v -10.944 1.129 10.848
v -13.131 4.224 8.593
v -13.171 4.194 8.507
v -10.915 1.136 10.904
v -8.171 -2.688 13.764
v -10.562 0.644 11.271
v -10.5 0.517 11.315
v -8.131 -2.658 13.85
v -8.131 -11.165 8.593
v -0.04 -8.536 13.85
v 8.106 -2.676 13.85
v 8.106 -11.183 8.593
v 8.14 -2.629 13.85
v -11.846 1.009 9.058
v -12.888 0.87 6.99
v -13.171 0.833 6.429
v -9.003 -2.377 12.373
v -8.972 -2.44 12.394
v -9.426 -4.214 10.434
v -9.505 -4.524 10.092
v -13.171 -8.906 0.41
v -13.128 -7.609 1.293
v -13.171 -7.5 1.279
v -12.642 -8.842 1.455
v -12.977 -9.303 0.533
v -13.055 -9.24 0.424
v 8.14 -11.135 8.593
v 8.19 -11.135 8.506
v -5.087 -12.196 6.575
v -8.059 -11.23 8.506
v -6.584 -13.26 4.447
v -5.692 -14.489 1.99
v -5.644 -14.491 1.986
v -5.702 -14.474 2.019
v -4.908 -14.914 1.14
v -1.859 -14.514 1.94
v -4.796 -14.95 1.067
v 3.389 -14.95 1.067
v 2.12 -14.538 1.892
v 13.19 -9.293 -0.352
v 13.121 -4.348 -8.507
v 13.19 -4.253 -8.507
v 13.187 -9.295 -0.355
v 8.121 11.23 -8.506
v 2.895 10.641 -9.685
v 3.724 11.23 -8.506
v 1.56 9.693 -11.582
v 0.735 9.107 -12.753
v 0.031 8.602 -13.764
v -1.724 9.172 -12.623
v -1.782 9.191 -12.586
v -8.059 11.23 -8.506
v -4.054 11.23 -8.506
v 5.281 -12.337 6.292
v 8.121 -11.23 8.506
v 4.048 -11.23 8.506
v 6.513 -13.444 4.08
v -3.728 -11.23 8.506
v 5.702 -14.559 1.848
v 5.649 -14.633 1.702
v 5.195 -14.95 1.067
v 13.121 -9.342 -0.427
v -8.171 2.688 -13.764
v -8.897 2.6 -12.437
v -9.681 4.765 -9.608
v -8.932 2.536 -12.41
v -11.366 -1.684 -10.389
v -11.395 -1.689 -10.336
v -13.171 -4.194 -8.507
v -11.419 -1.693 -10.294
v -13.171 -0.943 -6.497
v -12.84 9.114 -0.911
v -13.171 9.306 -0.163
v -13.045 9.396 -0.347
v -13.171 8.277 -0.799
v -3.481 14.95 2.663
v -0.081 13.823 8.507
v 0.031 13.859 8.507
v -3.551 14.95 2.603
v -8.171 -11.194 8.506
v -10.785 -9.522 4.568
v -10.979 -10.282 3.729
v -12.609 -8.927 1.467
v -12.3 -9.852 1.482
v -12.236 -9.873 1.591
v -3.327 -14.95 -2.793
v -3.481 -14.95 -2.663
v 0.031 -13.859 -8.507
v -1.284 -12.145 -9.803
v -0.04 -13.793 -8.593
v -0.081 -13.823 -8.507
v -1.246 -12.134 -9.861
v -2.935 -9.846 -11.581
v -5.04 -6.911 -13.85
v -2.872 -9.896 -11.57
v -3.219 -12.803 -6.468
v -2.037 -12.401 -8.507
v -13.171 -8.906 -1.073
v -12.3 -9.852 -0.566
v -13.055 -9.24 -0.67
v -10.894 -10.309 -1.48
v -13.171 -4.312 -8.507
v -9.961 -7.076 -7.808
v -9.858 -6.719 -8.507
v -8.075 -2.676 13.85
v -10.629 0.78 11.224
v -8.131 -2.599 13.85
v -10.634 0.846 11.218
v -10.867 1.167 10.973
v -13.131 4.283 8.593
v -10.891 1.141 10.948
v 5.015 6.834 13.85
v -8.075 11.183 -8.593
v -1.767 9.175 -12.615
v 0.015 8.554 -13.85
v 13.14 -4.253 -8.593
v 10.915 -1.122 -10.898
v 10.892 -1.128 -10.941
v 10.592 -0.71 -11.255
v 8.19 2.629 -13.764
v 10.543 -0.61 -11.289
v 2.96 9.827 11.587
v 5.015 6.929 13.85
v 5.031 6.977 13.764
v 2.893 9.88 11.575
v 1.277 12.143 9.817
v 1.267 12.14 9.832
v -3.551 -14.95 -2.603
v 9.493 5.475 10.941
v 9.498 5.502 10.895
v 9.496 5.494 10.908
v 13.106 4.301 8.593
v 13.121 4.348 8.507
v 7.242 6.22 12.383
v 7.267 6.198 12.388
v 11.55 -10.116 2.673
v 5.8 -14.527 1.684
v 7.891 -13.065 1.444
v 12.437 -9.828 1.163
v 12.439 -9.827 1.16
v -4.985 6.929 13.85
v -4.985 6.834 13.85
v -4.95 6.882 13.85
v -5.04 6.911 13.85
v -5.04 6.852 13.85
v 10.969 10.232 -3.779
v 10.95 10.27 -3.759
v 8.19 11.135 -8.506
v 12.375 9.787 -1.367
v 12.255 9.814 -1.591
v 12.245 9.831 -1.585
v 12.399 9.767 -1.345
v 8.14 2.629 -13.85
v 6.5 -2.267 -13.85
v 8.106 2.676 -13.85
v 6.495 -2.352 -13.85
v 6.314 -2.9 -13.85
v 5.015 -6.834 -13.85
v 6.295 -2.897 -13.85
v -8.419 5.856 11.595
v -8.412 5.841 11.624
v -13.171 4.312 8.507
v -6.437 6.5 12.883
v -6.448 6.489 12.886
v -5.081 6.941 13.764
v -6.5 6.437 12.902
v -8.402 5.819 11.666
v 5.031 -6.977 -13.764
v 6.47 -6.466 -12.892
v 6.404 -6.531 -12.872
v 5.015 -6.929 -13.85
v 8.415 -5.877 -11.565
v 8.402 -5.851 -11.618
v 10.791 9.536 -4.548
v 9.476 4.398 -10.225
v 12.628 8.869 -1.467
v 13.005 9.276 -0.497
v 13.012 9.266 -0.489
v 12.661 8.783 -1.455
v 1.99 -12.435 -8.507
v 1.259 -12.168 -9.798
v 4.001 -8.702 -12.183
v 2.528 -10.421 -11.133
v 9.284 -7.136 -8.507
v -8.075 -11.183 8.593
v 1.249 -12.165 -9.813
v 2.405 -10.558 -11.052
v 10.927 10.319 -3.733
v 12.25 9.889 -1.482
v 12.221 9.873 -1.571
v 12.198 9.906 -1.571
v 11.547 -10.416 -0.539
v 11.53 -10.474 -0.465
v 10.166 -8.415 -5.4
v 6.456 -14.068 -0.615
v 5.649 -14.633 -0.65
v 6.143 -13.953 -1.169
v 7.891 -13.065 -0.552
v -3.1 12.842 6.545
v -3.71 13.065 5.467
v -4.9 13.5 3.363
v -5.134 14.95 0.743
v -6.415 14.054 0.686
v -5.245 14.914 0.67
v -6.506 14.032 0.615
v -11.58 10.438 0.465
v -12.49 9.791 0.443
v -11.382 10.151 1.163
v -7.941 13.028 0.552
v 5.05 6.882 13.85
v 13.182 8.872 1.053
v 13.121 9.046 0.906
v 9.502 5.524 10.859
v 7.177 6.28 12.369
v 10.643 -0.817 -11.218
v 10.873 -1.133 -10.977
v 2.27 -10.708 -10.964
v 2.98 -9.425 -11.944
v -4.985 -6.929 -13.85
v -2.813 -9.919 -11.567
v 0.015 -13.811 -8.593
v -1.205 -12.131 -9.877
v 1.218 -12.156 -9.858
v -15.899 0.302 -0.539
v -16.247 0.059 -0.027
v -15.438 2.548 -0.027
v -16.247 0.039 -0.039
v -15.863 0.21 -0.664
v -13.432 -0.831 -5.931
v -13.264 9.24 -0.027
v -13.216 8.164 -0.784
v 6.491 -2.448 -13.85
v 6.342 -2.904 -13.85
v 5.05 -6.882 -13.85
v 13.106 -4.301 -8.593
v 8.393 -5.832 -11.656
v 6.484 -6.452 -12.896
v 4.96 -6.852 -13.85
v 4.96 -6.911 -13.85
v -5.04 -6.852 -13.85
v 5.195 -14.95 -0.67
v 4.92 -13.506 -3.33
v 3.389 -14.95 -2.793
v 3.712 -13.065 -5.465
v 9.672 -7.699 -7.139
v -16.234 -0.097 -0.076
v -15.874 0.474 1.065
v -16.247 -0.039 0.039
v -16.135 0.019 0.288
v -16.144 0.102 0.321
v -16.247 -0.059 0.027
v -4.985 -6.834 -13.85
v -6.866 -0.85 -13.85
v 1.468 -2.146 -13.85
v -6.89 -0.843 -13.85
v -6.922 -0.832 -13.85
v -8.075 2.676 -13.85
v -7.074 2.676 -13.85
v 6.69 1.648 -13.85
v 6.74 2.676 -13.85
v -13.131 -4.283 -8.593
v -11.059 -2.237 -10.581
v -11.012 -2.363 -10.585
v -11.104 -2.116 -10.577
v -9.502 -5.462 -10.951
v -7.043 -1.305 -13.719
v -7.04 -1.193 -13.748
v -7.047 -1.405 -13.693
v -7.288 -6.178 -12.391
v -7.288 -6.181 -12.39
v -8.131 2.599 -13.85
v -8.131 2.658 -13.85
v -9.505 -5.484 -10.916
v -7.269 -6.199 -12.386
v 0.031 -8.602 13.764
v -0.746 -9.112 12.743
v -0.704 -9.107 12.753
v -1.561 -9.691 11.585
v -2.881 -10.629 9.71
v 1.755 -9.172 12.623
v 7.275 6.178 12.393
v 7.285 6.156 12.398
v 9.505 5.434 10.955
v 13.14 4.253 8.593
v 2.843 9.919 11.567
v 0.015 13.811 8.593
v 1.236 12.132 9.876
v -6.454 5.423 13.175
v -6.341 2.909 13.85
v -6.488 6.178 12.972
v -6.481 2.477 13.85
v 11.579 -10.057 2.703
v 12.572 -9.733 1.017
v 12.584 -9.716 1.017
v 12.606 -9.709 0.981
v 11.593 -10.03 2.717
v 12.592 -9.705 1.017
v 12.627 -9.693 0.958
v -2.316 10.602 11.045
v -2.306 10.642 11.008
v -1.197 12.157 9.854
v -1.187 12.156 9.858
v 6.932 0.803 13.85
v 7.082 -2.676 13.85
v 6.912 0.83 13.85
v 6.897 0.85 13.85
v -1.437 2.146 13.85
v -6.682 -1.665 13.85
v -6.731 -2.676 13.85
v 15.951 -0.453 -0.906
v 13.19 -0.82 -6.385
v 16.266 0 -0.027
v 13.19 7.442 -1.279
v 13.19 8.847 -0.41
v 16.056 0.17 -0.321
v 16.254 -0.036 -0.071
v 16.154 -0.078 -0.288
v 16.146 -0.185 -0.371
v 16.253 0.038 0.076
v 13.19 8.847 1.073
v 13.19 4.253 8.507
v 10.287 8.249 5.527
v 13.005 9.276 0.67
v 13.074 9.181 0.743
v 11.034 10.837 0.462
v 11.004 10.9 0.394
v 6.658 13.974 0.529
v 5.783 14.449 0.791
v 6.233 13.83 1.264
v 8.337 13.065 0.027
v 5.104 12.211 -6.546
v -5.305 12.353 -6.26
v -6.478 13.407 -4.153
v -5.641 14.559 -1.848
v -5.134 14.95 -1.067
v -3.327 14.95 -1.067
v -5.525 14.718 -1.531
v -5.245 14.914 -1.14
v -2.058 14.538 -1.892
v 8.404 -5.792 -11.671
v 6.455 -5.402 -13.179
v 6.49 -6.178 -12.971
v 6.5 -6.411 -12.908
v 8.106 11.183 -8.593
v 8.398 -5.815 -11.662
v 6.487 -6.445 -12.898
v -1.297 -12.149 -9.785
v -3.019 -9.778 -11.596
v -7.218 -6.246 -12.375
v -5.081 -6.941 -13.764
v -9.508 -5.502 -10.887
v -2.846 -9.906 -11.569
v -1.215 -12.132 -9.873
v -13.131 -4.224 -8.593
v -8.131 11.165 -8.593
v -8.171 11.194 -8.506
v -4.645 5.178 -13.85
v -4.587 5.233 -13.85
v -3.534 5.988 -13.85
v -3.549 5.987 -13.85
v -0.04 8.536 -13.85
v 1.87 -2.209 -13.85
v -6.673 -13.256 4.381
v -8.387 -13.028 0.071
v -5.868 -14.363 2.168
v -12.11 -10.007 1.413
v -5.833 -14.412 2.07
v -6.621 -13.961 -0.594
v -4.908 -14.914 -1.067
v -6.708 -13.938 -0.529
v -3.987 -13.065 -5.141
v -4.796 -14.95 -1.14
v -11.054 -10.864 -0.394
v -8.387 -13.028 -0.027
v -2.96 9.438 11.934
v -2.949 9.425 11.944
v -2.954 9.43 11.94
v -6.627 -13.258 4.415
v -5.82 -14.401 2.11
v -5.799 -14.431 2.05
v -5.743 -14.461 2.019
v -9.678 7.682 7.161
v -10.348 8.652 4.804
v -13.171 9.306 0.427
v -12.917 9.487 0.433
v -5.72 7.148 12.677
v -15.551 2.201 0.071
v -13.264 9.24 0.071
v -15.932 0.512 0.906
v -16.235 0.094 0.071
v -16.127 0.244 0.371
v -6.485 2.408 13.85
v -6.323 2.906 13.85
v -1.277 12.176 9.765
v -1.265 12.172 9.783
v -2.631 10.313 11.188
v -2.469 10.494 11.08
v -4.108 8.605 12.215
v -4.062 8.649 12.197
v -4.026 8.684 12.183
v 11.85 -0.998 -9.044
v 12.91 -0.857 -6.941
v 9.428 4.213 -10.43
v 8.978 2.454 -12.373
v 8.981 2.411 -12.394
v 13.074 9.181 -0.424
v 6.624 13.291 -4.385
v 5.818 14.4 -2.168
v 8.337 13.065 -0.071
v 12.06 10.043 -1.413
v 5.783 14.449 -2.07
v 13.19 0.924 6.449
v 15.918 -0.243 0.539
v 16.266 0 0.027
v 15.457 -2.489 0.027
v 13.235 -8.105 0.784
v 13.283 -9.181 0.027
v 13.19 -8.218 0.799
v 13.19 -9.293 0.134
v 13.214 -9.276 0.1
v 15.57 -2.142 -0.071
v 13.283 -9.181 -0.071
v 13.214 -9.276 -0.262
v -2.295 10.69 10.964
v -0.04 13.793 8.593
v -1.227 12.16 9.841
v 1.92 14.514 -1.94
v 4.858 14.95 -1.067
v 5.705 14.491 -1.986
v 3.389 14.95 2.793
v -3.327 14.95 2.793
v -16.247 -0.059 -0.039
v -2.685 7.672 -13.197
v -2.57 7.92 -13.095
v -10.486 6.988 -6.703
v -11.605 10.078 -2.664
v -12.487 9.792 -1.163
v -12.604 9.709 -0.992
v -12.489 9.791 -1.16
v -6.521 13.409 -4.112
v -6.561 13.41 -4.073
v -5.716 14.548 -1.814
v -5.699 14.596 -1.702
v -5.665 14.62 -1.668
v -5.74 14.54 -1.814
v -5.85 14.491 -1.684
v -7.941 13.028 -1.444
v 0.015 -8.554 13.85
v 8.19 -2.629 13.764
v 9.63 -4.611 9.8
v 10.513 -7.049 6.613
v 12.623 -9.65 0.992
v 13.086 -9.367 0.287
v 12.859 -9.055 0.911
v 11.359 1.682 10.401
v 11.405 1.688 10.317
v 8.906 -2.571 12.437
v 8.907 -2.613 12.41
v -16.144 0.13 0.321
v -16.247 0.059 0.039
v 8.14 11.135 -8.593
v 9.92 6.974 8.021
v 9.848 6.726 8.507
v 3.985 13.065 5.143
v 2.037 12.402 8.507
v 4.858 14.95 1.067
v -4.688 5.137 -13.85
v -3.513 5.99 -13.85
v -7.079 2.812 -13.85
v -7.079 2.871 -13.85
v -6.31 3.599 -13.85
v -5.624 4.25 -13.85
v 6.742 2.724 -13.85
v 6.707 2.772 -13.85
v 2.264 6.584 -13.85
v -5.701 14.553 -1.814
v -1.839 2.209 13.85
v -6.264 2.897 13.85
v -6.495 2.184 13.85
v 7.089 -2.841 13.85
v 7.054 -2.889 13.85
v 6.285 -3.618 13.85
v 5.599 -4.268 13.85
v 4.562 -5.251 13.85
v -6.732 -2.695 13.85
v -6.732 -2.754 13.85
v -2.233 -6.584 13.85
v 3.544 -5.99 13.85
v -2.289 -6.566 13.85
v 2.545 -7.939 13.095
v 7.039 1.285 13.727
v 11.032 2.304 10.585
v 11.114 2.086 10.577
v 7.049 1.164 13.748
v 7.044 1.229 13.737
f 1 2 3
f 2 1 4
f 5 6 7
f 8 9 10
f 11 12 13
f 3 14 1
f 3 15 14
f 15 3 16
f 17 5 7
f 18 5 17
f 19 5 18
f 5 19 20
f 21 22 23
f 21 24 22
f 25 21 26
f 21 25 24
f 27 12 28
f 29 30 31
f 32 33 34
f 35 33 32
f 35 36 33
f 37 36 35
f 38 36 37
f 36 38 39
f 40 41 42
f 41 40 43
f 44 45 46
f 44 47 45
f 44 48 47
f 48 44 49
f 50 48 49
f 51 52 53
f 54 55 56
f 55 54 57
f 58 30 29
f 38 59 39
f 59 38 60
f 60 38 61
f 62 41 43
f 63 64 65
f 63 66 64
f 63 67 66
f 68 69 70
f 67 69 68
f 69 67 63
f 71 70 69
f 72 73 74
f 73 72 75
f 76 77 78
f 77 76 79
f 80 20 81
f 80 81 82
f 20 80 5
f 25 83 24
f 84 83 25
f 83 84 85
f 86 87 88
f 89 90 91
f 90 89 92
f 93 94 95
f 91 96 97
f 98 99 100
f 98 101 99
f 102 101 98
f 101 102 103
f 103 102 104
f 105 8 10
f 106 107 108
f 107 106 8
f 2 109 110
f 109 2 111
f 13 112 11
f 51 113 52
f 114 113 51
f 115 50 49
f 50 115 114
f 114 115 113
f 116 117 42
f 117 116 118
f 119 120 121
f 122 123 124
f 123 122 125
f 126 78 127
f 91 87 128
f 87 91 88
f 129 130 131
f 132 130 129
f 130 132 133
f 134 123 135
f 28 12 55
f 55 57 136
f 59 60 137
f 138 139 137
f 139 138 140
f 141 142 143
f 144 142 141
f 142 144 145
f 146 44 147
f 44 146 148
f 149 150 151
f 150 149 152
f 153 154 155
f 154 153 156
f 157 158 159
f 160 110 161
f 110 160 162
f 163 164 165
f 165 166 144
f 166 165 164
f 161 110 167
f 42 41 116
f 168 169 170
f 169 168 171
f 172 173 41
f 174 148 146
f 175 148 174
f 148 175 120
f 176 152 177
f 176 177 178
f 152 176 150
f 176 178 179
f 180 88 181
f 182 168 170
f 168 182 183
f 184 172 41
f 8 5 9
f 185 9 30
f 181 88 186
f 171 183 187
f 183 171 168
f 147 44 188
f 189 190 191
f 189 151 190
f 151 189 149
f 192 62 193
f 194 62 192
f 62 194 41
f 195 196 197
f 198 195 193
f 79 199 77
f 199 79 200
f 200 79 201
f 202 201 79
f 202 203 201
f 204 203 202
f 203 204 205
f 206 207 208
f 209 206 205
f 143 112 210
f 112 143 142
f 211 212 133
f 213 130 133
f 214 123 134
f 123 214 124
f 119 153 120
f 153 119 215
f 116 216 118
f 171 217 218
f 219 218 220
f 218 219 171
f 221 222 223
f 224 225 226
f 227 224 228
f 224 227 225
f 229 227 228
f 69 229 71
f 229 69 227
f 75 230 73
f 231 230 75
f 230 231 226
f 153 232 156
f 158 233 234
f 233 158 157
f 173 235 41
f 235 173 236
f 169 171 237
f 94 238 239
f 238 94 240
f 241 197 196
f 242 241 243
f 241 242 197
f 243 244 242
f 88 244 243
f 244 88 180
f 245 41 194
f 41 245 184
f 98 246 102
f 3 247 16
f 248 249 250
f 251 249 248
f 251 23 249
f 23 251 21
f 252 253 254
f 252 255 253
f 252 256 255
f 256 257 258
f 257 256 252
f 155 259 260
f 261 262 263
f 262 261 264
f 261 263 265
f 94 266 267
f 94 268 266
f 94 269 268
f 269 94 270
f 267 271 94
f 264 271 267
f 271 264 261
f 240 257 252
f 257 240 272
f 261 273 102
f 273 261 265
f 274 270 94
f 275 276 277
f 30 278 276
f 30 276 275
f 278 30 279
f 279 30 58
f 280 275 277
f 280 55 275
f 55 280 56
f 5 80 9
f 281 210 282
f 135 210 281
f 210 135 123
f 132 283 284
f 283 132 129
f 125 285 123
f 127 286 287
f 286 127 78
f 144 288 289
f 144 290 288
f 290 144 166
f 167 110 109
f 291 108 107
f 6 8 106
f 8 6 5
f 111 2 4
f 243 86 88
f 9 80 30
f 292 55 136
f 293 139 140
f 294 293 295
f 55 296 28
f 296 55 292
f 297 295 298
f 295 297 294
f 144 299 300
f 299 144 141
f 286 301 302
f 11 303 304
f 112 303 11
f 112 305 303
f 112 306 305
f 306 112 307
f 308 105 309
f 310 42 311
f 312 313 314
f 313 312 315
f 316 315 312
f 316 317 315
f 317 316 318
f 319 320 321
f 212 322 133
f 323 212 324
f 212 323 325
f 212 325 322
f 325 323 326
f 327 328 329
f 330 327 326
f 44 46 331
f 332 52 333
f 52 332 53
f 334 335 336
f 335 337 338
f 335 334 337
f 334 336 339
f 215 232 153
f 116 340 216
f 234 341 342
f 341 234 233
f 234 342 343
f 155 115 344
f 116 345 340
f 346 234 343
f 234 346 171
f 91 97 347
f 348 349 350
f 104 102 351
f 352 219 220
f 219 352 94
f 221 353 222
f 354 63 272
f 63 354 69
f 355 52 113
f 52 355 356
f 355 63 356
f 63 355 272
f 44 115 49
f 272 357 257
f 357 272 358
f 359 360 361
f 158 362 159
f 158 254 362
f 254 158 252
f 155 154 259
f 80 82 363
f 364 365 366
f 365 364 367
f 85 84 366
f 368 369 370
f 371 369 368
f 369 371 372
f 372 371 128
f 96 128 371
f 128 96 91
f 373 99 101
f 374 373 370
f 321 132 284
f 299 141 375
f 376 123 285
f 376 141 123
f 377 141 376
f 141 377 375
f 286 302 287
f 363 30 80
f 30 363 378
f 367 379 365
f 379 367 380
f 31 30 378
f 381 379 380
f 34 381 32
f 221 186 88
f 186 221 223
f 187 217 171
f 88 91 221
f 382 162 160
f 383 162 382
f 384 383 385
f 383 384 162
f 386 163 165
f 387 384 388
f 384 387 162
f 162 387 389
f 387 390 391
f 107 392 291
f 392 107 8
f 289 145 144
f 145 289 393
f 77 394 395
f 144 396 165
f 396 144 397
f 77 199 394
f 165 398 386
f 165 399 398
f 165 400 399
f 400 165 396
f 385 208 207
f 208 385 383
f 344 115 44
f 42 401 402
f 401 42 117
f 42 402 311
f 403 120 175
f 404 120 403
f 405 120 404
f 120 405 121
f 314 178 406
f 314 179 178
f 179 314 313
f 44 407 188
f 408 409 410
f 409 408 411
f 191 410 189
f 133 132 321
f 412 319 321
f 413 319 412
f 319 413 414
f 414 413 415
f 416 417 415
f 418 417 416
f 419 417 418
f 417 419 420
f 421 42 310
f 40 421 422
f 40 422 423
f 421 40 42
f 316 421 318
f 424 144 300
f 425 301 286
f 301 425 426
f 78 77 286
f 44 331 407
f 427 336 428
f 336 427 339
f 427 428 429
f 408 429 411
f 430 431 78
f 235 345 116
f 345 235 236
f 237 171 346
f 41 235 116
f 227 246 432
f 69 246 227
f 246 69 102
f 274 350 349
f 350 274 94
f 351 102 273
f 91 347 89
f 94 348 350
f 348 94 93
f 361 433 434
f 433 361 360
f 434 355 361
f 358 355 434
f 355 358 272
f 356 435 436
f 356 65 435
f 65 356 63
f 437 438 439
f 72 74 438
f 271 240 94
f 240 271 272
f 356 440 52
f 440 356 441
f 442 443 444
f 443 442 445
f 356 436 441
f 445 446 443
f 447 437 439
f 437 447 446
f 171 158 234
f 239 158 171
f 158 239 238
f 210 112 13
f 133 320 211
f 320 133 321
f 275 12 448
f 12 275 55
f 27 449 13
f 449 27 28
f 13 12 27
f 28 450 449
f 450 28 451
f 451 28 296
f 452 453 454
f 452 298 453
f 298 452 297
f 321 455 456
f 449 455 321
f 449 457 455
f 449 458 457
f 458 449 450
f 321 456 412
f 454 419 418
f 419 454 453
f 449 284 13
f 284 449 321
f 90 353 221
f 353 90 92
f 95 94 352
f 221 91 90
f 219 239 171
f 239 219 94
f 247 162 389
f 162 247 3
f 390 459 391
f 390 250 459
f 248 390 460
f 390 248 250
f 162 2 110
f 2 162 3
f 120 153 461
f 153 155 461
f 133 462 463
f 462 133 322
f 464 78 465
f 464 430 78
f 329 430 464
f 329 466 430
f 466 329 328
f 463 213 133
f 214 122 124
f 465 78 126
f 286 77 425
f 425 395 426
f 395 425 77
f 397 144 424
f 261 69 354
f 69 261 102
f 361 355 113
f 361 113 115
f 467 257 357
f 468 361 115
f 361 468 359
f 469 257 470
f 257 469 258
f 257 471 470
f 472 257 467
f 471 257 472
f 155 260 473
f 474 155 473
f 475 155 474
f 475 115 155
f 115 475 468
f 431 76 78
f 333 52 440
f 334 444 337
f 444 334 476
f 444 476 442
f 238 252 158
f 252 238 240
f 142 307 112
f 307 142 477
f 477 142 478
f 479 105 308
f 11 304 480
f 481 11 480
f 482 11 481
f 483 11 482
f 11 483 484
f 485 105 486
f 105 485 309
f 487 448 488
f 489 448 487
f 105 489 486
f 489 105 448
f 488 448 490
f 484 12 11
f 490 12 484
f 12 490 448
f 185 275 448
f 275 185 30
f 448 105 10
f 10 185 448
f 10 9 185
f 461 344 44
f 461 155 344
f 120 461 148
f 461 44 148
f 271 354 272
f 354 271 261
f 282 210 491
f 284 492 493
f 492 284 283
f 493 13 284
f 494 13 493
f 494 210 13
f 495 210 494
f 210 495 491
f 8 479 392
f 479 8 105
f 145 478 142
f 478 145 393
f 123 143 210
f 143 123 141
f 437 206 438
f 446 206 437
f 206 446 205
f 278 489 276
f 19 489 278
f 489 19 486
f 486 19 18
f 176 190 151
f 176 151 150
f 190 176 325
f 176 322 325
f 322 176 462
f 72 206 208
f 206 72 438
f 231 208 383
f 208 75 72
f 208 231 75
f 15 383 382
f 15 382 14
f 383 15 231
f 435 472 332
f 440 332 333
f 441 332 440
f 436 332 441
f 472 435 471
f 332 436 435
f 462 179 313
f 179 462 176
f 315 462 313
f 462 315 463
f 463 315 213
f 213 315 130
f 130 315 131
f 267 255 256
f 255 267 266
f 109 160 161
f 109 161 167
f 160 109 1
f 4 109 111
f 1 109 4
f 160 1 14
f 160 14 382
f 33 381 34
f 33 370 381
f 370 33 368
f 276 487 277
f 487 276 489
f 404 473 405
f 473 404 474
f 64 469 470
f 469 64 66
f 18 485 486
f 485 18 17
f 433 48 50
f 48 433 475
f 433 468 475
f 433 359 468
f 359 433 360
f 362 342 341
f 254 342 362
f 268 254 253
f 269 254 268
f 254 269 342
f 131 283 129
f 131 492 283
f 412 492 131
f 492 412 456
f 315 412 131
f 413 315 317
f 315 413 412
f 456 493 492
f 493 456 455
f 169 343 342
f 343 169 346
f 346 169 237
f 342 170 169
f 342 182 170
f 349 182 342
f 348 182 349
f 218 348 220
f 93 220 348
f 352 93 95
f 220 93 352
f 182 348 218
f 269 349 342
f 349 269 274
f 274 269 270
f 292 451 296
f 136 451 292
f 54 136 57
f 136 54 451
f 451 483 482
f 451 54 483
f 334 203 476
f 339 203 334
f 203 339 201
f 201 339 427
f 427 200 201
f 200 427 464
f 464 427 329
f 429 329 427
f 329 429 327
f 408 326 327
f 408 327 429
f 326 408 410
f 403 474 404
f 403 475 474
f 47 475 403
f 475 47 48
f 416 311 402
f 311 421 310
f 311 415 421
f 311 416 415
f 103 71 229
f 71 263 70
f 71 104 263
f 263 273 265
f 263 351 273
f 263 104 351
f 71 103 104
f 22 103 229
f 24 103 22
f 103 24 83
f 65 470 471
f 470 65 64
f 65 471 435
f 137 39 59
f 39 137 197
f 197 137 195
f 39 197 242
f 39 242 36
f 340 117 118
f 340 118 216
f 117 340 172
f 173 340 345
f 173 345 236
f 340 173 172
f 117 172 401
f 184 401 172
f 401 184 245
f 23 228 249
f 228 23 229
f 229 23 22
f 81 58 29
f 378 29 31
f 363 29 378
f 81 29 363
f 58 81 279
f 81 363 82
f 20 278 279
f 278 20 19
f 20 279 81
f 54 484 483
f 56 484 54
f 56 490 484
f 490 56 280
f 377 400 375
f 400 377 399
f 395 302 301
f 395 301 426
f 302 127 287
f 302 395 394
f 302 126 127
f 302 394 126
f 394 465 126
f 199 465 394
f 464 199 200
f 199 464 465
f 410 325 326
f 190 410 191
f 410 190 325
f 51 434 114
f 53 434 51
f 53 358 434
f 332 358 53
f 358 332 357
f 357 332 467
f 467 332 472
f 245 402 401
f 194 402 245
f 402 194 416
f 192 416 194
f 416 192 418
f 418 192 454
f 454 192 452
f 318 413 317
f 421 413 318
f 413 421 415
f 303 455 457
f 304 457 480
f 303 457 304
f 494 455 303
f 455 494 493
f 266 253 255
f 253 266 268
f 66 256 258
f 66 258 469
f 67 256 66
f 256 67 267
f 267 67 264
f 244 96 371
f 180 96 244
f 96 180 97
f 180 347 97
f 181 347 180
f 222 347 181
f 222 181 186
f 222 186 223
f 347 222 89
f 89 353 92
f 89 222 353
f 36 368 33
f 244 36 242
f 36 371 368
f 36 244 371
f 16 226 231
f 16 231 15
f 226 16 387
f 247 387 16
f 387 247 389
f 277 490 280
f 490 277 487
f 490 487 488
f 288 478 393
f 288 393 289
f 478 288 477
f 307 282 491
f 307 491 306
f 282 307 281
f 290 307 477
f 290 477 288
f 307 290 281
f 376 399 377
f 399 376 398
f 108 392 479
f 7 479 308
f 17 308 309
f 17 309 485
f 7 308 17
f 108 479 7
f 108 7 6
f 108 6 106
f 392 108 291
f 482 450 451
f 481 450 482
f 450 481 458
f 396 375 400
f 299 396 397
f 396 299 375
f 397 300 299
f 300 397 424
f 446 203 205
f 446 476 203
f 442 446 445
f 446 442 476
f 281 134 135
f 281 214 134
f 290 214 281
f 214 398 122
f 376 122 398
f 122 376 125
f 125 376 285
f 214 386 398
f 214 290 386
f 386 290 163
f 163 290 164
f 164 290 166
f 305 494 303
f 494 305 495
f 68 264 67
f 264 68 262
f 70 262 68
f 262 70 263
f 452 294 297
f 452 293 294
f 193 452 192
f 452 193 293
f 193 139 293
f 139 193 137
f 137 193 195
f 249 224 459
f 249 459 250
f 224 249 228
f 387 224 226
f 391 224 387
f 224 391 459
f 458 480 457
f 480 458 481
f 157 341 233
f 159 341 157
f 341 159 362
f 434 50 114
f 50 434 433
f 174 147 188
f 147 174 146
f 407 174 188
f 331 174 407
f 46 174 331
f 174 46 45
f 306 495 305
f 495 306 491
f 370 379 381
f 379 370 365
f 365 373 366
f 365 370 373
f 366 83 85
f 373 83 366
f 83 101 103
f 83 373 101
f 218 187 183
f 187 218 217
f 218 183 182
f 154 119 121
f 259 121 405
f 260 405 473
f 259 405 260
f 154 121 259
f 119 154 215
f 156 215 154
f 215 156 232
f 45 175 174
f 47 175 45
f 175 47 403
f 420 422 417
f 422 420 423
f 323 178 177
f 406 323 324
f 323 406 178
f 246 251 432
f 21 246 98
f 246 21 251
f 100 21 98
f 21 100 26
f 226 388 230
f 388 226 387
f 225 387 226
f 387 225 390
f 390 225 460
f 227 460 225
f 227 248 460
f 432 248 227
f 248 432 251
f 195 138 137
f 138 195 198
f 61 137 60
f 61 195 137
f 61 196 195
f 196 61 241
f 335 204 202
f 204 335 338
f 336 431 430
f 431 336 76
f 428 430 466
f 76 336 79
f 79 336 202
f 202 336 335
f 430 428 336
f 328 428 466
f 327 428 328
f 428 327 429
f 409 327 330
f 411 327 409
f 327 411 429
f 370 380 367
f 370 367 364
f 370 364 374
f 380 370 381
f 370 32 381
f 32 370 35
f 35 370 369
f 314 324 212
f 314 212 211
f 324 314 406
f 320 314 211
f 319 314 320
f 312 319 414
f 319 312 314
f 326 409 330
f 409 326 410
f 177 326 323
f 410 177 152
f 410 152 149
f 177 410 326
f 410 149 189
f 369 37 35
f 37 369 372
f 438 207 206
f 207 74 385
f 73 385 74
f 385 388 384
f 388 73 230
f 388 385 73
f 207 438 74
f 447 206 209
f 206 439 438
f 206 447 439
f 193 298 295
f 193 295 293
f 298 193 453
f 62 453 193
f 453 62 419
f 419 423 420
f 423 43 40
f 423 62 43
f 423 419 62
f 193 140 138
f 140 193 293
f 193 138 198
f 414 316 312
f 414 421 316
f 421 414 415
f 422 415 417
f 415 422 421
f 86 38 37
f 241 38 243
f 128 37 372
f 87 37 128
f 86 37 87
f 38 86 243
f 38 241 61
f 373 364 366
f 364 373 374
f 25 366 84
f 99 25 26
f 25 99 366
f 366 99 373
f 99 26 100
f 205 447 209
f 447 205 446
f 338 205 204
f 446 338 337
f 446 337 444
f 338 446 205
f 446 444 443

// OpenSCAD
// Auto-generated OpenSCAD file

    shift = 0;

    inner_points = 10*[[-0.04653735601242833, -1.1804350968444532, -1.1056406492993445],
  [-1.6166026037261467, 6.465865108477383e-14, 0.06804417958749302],
  [0.049641563947034416, -1.1066196143606377, 1.1793908313155077],
  [0.04653735601243055, 1.1804350968444688, 1.1056406492993445],
  [1.616602603726149, -4.9166964514920346e-14, -0.06804417958749302],
  [-0.049641563947032195, 1.1066196143606533, -1.1793908313155077],
  [-0.8306107268634214, -1.2969563212498596, -0.4960081752746857],
  [-1.2974190314728422, -0.9180843128618442, 0.30308256300708786],
  [-0.4826654868478813, -1.4854916227486177, 0.42235370875540656],
  [-0.8612909006373893, -0.6130277869576795, -1.2249117950476633],
  [-1.2686573637106064, -0.18853530149869363, 0.9864060636175853],
  [0.5164498685564554, -1.485491622748653, 0.38030009303373413],
  [0.7859918768627263, -1.2969563212499164, -0.5640523548621788],
  [-1.3470605954198756, 0.18853530149880124, -0.8763082683084198],
  [-0.4361281308354518, -0.30505652590415705, 1.527994358054751],
  [-0.7553117030887562, 0.6130277869577517, 1.2929559746351562],
  [1.318298927657642, -0.9180843128619364, 0.19298476769792233],
  [-0.5629872245688826, 0.3050565259042077, -1.4859407423330786],
  [0.8612909006373916, 0.613027786957695, 1.2249117950476633],
  [1.2686573637106087, 0.18853530149870912, -0.9864060636175853],
  [-0.5164498685564531, 1.4854916227486685, -0.38030009303373413],
  [-0.7859918768627241, 1.296956321249932, 0.5640523548621788],
  [1.3470605954198778, -0.18853530149878575, 0.8763082683084198],
  [0.43612813083545404, 0.3050565259041726, -1.527994358054751],
  [0.7553117030887584, -0.6130277869577362, -1.2929559746351562],
  [-1.3182989276576398, 0.9180843128619519, -0.19298476769792233],
  [0.5629872245688848, -0.30505652590419213, 1.4859407423330786],
  [0.8306107268634236, 1.2969563212498751, 0.4960081752746857],
  [1.2974190314728444, 0.9180843128618598, -0.30308256300708786],
  [0.4826654868478835, 1.4854916227486332, -0.42235370875540656]];

    outer_points_unshifted = 10*[[6.50114665913391e-07, 1.3763745554391253, 0.8506627251086194],
  [-1.051887261389621e-06, 0.8506627251088678, -1.3763745554387234],
  [1.6180339887494224, 0.0, -1.2365742555582488e-06],
  [-6.50114665913391e-07, -1.3763745554391253, -0.8506627251086194],
  [1.051887261389621e-06, -0.8506627251088678, 1.3763745554387234],
  [-1.6180339887494224, 0.0, 1.2365742555582488e-06],
  [0.5000000000100363, 1.5388417685299496, 1.2941252355854567e-05],
  [0.8090163442765206, 1.1135237293503313, -0.8506417857224506],
  [1.3090169943808583, 0.951056516259507, 7.233888893346937e-06],
  [-0.4999999999896717, 1.5388417685299496, 1.3705497275402664e-05],
  [0.8090159424835605, 0.26287747283842533, -1.376380262802186],
  [1.3090176444829382, 0.42531803917961825, 0.8506534904005509],
  [0.5000010518972977, 0.6881790434210817, 1.3763874966910794],
  [-0.8090176444729018, 1.1135237293503313, -0.850640549148195],
  [1.3090163442661924, -0.42531803917961825, -0.850655491219726],
  [0.4999989481024103, -0.6881790434210817, -1.3763882609359988],
  [0.8090180462658619, -0.26287747283842533, 1.3763790262279305],
  [-1.3090169943682723, 0.951056516259507, 9.234708068453283e-06],
  [0.4999999999896717, -1.5388417685299496, -1.3705497275402664e-05],
  [-0.8090159424835605, -0.26287747283842533, 1.376380262802186],
  [-1.3090176444829382, -0.42531803917961825, -0.8506534904005509],
  [-0.5000010518972977, -0.6881790434210817, -1.3763874966910794],
  [0.8090176444729018, -1.1135237293503313, 0.850640549148195],
  [-1.3090163442661924, 0.42531803917961825, 0.850655491219726],
  [-0.4999989481024103, 0.6881790434210817, 1.3763882609359988],
  [-0.8090180462658619, 0.26287747283842533, -1.3763790262279305],
  [1.3090169943682723, -0.951056516259507, -9.234708068453283e-06],
  [-0.5000000000100363, -1.5388417685299496, -1.2941252355854567e-05],
  [-0.8090163442765206, -1.1135237293503313, 0.8506417857224506],
  [-1.3090169943808583, -0.951056516259507, -7.233888893346937e-06]];
    
    outer_points = [for (p = outer_points_unshifted) [p[0], p[1], p[2] + shift]];

    // Convex hull for inner set (I)
    module inner_hull() {
        hull() {
            for (p = inner_points) {
                translate(p) sphere(r=0.1);
            }
        }
    }

    // Convex hull for outer set (O) minus inner hull (O \ I)
    module outer_minus_inner() {
        difference() {
            hull() {
                for (p = outer_points) {
                    translate(p) sphere(r=0.1);
                }
            }
            inner_hull(); // Subtract inner hull
        }
    }

    // Convex hull for outer set (O) minus all translated inner hulls
    module outer_minus_AllTranslationInner() {
        difference() {
            hull() {
                for (p = outer_points) {
                    translate(p) sphere(r=0.1);
                }
            }
            hull() {
                translate([0,0,50]) inner_hull();
                translate([0,0,-50]) inner_hull();
            }; // Subtract translated inner hulls
        }
    }

    // Difference between outer_minus_inner and outer_minus_AllTranslationInner
    module outer_minus_inner_diff() {
        difference() {
            // Outer minus inner
            difference() {
                hull() {
                    for (p = outer_points) {
                        translate(p) sphere(r=0.1);
                    }
                }
                inner_hull();
            }

            // Subtract Outer minus AllTranslationInner
            difference() {
                hull() {
                    for (p = outer_points) {
                        translate(p) sphere(r=0.1);
                    }
                }
                hull() {
                    translate([0,0,50]) inner_hull();
                    translate([0,0,-50]) inner_hull();
                };
            }
        }
    }

    // Rendering all with colors applied
    // color([1, 0, 0, 0.5]) inner_hull(); // Transparent red
    // color([0, 1, 0, 1]) outer_minus_AllTranslationInner(); // Opaque green
    color([1, 1, 0, 1]) outer_minus_inner_diff(); // Opaque yellow
    
